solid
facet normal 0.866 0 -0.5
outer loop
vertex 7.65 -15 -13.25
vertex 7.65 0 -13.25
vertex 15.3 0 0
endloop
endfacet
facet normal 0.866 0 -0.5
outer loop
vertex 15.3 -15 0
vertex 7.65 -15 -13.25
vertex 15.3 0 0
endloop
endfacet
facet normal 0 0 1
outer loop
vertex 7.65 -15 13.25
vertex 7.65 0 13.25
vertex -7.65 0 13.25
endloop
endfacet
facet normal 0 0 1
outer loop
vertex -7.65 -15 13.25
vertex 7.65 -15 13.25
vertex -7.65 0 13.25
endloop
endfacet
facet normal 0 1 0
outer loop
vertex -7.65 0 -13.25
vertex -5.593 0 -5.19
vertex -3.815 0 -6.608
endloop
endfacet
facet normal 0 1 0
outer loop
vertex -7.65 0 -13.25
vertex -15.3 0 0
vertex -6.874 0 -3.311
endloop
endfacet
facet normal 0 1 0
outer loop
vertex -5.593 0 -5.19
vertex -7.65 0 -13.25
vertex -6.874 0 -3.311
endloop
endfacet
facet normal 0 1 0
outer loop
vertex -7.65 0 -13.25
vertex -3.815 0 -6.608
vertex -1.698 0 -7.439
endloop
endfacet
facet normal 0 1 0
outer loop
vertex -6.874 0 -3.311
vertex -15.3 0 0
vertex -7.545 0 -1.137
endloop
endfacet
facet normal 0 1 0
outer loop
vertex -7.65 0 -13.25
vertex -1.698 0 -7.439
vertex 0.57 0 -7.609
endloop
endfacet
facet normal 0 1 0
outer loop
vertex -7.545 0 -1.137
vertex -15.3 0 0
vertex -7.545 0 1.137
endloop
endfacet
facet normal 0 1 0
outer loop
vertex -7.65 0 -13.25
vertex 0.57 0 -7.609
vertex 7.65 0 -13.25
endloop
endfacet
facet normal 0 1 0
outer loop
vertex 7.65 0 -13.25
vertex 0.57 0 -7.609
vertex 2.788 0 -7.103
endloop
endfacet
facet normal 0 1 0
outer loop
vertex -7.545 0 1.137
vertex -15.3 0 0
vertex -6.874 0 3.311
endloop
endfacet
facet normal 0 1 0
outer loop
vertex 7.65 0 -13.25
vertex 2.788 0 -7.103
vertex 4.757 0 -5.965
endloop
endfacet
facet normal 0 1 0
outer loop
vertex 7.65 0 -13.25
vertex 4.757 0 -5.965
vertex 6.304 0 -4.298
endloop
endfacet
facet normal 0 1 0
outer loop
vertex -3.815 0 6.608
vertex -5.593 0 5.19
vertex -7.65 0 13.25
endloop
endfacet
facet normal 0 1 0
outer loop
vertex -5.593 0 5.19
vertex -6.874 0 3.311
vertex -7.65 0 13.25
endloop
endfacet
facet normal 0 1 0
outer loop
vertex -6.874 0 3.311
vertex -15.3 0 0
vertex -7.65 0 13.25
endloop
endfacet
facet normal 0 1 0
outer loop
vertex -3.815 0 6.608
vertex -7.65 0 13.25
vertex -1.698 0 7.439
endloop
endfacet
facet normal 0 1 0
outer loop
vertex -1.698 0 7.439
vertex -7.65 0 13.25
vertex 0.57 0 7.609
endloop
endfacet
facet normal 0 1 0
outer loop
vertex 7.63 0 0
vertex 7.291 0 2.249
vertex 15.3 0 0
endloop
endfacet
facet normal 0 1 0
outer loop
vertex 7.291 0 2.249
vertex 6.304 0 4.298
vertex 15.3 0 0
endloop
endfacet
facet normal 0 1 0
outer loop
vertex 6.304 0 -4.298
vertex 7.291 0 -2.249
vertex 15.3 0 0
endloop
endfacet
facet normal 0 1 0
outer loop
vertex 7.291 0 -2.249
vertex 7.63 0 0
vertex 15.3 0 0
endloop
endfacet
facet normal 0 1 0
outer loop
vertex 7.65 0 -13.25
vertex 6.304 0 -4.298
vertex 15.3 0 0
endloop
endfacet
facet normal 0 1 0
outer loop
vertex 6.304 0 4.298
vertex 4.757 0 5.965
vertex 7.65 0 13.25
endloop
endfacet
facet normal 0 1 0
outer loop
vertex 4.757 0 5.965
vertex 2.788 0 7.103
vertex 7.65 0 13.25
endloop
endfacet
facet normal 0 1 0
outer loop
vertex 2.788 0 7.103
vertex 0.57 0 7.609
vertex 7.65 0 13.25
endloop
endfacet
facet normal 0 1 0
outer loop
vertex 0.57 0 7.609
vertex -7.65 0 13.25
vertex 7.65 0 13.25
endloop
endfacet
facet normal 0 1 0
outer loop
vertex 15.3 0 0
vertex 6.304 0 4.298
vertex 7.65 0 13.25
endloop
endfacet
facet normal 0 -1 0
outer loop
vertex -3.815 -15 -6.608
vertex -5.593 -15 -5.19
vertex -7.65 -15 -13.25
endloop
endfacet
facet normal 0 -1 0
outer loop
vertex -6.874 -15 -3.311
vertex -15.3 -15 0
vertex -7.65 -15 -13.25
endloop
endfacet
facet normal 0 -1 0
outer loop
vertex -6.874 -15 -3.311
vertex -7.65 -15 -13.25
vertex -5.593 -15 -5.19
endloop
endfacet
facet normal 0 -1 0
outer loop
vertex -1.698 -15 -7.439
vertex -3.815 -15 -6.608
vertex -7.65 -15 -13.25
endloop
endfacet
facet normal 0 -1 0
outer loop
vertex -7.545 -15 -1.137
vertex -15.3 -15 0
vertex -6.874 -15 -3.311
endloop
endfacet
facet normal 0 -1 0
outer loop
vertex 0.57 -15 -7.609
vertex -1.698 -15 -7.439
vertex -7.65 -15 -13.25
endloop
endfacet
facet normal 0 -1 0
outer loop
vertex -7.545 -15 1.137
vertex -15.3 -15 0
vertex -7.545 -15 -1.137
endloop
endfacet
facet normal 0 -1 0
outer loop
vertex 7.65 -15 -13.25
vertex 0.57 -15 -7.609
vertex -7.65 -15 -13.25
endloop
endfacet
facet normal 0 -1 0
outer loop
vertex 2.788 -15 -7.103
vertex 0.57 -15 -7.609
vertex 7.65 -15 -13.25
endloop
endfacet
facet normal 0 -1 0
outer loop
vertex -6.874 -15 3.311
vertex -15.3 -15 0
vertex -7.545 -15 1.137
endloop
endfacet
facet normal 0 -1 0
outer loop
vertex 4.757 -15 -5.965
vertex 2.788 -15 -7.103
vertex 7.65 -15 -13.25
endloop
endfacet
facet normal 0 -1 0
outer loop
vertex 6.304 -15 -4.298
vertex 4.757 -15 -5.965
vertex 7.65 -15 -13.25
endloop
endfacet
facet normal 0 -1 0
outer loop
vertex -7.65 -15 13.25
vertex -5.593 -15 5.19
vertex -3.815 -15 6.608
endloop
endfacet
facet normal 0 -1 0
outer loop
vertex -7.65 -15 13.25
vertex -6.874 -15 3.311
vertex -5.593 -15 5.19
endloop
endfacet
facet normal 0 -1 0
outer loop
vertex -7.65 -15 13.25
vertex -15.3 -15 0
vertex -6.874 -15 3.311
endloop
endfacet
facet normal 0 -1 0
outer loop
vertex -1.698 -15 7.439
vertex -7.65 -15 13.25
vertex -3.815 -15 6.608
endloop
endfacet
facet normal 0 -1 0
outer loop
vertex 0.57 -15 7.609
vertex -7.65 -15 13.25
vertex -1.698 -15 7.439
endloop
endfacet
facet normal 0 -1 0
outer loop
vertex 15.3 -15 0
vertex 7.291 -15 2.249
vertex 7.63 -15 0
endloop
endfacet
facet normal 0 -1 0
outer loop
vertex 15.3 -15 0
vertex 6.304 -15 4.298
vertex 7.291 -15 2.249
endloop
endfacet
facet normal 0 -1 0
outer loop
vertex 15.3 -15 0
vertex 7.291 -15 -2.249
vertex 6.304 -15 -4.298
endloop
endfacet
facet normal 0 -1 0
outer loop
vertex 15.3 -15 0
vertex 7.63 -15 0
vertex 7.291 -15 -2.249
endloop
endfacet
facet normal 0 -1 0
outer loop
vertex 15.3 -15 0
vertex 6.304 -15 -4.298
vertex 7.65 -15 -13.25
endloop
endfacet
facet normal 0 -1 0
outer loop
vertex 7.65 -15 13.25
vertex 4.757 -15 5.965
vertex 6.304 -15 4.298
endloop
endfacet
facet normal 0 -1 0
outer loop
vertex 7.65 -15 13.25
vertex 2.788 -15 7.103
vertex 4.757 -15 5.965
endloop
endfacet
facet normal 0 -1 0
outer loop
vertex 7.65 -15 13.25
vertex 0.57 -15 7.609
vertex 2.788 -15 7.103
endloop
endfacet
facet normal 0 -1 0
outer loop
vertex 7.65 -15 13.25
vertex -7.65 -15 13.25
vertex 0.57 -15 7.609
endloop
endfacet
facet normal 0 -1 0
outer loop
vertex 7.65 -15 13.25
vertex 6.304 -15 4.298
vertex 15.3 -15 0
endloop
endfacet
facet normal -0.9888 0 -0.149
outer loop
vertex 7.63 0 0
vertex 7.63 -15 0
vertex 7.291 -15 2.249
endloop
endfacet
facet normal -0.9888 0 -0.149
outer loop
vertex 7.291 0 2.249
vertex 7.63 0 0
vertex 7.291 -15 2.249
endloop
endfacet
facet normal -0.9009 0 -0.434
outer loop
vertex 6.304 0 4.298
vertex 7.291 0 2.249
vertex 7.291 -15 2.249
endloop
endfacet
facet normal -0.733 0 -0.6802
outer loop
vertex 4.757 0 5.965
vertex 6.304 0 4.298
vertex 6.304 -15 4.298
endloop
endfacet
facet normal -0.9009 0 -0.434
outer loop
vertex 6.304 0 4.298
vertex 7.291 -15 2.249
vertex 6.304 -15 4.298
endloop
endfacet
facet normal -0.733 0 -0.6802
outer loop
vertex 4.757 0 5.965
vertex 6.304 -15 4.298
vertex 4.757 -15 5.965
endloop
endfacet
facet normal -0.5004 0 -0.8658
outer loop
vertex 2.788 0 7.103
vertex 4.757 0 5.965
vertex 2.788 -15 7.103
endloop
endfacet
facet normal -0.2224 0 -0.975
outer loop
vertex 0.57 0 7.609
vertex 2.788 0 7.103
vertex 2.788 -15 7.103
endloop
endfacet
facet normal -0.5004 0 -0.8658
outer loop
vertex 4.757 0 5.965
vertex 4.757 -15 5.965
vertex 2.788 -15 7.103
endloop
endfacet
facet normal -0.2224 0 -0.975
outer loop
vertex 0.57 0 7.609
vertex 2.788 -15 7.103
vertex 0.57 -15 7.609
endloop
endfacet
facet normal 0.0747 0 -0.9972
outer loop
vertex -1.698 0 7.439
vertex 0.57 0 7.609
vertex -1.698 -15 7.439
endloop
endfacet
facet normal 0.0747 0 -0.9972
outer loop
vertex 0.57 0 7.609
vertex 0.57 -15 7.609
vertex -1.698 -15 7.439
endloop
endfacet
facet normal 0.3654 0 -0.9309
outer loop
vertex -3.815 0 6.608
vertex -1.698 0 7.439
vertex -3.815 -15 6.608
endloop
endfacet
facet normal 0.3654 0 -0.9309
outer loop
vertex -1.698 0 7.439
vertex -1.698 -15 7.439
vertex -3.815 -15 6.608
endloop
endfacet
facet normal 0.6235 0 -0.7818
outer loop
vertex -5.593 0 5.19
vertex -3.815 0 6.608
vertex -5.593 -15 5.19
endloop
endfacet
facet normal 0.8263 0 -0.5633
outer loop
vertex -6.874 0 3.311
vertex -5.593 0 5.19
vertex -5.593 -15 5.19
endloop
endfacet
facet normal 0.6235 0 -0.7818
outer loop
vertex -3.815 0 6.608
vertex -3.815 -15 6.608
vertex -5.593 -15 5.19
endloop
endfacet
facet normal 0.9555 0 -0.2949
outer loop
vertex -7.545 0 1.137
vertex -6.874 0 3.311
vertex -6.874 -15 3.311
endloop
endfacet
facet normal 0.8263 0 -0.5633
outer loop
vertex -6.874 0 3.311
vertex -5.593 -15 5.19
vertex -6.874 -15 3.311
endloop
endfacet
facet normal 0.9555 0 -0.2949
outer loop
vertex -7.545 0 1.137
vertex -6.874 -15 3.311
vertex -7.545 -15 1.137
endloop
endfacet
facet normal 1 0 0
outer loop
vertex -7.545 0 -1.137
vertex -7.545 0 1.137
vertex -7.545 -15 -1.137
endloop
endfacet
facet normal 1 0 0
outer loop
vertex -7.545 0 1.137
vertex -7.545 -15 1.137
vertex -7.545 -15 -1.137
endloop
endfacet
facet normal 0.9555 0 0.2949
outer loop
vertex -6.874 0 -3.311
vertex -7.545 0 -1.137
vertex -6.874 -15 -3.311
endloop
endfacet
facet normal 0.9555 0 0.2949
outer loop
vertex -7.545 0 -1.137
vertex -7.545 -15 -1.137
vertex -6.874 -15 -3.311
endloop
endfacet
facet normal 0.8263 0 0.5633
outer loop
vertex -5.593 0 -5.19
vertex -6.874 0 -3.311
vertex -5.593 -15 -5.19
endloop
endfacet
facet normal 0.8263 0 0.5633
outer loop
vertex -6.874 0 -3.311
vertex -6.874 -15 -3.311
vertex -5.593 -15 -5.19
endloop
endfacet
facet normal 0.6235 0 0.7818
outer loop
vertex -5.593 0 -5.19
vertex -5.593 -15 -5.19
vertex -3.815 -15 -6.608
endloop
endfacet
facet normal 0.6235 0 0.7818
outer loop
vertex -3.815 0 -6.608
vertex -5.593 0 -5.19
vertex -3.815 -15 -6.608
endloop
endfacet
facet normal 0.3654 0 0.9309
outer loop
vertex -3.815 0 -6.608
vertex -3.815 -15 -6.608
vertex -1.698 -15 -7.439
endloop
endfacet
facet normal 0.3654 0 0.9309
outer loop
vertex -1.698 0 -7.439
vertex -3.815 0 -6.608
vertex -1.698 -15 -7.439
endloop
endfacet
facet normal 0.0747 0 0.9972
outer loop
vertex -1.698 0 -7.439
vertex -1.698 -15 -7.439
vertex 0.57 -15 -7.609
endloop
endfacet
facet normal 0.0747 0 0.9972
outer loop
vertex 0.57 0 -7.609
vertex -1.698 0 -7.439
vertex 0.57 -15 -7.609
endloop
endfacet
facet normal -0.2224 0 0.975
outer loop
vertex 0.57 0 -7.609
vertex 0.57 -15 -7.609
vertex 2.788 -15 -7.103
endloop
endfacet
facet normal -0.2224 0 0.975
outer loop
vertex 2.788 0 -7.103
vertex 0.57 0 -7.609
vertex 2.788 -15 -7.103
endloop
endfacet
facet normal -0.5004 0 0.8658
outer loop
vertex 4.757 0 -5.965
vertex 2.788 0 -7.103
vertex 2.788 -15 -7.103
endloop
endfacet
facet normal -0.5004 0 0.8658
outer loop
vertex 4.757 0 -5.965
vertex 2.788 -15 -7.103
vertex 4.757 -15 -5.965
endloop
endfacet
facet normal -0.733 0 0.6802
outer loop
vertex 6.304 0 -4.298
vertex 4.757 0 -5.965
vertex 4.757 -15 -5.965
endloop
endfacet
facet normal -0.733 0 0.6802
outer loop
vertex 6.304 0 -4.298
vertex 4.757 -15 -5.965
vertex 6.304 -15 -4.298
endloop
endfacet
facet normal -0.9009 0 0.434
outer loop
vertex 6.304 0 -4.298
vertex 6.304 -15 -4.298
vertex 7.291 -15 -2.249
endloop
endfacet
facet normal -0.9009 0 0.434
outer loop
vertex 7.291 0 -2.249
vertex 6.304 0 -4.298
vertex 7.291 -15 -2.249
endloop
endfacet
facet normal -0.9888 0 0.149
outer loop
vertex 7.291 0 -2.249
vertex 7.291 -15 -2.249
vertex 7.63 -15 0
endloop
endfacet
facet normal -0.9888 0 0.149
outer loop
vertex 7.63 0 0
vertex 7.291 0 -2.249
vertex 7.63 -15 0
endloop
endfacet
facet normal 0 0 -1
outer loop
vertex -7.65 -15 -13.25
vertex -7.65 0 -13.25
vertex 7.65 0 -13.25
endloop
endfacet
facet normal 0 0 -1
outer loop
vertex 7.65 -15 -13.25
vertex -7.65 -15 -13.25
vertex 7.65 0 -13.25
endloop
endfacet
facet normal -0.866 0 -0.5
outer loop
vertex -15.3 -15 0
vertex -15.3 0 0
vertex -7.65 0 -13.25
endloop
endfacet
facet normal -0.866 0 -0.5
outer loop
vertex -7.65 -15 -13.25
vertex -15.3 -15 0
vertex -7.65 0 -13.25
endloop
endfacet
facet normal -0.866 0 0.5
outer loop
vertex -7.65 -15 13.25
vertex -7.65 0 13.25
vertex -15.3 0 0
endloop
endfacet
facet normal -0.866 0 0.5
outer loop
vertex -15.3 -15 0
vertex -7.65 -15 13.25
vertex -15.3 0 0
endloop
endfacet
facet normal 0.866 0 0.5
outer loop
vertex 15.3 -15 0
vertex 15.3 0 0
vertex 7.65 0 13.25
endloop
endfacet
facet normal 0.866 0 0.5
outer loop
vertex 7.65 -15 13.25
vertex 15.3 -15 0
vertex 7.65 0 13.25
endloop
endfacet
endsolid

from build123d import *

# Parameters (mm, degrees)
F1_DEPTH = 15
F2_R     = 7.63
F3_DEPTH = 15.001


with BuildPart() as f1:
    # F0 (on Front) → F1 (new body)
    with BuildSketch(Plane.XZ):
        Polygon((-7.649891, 13.25), (-15.299782, 0), (-7.649891, -13.25), (7.649891, -13.25), (15.299782, 0), (7.649891, 13.25), align=None)
    extrude(amount=F1_DEPTH)

    # F2 (on face) → F3 (cut, through all)
    with BuildSketch(Plane.XZ.offset(15)):
        Circle(F2_R)
    extrude(amount=-F3_DEPTH, mode=Mode.SUBTRACT)


solid = f1.part
